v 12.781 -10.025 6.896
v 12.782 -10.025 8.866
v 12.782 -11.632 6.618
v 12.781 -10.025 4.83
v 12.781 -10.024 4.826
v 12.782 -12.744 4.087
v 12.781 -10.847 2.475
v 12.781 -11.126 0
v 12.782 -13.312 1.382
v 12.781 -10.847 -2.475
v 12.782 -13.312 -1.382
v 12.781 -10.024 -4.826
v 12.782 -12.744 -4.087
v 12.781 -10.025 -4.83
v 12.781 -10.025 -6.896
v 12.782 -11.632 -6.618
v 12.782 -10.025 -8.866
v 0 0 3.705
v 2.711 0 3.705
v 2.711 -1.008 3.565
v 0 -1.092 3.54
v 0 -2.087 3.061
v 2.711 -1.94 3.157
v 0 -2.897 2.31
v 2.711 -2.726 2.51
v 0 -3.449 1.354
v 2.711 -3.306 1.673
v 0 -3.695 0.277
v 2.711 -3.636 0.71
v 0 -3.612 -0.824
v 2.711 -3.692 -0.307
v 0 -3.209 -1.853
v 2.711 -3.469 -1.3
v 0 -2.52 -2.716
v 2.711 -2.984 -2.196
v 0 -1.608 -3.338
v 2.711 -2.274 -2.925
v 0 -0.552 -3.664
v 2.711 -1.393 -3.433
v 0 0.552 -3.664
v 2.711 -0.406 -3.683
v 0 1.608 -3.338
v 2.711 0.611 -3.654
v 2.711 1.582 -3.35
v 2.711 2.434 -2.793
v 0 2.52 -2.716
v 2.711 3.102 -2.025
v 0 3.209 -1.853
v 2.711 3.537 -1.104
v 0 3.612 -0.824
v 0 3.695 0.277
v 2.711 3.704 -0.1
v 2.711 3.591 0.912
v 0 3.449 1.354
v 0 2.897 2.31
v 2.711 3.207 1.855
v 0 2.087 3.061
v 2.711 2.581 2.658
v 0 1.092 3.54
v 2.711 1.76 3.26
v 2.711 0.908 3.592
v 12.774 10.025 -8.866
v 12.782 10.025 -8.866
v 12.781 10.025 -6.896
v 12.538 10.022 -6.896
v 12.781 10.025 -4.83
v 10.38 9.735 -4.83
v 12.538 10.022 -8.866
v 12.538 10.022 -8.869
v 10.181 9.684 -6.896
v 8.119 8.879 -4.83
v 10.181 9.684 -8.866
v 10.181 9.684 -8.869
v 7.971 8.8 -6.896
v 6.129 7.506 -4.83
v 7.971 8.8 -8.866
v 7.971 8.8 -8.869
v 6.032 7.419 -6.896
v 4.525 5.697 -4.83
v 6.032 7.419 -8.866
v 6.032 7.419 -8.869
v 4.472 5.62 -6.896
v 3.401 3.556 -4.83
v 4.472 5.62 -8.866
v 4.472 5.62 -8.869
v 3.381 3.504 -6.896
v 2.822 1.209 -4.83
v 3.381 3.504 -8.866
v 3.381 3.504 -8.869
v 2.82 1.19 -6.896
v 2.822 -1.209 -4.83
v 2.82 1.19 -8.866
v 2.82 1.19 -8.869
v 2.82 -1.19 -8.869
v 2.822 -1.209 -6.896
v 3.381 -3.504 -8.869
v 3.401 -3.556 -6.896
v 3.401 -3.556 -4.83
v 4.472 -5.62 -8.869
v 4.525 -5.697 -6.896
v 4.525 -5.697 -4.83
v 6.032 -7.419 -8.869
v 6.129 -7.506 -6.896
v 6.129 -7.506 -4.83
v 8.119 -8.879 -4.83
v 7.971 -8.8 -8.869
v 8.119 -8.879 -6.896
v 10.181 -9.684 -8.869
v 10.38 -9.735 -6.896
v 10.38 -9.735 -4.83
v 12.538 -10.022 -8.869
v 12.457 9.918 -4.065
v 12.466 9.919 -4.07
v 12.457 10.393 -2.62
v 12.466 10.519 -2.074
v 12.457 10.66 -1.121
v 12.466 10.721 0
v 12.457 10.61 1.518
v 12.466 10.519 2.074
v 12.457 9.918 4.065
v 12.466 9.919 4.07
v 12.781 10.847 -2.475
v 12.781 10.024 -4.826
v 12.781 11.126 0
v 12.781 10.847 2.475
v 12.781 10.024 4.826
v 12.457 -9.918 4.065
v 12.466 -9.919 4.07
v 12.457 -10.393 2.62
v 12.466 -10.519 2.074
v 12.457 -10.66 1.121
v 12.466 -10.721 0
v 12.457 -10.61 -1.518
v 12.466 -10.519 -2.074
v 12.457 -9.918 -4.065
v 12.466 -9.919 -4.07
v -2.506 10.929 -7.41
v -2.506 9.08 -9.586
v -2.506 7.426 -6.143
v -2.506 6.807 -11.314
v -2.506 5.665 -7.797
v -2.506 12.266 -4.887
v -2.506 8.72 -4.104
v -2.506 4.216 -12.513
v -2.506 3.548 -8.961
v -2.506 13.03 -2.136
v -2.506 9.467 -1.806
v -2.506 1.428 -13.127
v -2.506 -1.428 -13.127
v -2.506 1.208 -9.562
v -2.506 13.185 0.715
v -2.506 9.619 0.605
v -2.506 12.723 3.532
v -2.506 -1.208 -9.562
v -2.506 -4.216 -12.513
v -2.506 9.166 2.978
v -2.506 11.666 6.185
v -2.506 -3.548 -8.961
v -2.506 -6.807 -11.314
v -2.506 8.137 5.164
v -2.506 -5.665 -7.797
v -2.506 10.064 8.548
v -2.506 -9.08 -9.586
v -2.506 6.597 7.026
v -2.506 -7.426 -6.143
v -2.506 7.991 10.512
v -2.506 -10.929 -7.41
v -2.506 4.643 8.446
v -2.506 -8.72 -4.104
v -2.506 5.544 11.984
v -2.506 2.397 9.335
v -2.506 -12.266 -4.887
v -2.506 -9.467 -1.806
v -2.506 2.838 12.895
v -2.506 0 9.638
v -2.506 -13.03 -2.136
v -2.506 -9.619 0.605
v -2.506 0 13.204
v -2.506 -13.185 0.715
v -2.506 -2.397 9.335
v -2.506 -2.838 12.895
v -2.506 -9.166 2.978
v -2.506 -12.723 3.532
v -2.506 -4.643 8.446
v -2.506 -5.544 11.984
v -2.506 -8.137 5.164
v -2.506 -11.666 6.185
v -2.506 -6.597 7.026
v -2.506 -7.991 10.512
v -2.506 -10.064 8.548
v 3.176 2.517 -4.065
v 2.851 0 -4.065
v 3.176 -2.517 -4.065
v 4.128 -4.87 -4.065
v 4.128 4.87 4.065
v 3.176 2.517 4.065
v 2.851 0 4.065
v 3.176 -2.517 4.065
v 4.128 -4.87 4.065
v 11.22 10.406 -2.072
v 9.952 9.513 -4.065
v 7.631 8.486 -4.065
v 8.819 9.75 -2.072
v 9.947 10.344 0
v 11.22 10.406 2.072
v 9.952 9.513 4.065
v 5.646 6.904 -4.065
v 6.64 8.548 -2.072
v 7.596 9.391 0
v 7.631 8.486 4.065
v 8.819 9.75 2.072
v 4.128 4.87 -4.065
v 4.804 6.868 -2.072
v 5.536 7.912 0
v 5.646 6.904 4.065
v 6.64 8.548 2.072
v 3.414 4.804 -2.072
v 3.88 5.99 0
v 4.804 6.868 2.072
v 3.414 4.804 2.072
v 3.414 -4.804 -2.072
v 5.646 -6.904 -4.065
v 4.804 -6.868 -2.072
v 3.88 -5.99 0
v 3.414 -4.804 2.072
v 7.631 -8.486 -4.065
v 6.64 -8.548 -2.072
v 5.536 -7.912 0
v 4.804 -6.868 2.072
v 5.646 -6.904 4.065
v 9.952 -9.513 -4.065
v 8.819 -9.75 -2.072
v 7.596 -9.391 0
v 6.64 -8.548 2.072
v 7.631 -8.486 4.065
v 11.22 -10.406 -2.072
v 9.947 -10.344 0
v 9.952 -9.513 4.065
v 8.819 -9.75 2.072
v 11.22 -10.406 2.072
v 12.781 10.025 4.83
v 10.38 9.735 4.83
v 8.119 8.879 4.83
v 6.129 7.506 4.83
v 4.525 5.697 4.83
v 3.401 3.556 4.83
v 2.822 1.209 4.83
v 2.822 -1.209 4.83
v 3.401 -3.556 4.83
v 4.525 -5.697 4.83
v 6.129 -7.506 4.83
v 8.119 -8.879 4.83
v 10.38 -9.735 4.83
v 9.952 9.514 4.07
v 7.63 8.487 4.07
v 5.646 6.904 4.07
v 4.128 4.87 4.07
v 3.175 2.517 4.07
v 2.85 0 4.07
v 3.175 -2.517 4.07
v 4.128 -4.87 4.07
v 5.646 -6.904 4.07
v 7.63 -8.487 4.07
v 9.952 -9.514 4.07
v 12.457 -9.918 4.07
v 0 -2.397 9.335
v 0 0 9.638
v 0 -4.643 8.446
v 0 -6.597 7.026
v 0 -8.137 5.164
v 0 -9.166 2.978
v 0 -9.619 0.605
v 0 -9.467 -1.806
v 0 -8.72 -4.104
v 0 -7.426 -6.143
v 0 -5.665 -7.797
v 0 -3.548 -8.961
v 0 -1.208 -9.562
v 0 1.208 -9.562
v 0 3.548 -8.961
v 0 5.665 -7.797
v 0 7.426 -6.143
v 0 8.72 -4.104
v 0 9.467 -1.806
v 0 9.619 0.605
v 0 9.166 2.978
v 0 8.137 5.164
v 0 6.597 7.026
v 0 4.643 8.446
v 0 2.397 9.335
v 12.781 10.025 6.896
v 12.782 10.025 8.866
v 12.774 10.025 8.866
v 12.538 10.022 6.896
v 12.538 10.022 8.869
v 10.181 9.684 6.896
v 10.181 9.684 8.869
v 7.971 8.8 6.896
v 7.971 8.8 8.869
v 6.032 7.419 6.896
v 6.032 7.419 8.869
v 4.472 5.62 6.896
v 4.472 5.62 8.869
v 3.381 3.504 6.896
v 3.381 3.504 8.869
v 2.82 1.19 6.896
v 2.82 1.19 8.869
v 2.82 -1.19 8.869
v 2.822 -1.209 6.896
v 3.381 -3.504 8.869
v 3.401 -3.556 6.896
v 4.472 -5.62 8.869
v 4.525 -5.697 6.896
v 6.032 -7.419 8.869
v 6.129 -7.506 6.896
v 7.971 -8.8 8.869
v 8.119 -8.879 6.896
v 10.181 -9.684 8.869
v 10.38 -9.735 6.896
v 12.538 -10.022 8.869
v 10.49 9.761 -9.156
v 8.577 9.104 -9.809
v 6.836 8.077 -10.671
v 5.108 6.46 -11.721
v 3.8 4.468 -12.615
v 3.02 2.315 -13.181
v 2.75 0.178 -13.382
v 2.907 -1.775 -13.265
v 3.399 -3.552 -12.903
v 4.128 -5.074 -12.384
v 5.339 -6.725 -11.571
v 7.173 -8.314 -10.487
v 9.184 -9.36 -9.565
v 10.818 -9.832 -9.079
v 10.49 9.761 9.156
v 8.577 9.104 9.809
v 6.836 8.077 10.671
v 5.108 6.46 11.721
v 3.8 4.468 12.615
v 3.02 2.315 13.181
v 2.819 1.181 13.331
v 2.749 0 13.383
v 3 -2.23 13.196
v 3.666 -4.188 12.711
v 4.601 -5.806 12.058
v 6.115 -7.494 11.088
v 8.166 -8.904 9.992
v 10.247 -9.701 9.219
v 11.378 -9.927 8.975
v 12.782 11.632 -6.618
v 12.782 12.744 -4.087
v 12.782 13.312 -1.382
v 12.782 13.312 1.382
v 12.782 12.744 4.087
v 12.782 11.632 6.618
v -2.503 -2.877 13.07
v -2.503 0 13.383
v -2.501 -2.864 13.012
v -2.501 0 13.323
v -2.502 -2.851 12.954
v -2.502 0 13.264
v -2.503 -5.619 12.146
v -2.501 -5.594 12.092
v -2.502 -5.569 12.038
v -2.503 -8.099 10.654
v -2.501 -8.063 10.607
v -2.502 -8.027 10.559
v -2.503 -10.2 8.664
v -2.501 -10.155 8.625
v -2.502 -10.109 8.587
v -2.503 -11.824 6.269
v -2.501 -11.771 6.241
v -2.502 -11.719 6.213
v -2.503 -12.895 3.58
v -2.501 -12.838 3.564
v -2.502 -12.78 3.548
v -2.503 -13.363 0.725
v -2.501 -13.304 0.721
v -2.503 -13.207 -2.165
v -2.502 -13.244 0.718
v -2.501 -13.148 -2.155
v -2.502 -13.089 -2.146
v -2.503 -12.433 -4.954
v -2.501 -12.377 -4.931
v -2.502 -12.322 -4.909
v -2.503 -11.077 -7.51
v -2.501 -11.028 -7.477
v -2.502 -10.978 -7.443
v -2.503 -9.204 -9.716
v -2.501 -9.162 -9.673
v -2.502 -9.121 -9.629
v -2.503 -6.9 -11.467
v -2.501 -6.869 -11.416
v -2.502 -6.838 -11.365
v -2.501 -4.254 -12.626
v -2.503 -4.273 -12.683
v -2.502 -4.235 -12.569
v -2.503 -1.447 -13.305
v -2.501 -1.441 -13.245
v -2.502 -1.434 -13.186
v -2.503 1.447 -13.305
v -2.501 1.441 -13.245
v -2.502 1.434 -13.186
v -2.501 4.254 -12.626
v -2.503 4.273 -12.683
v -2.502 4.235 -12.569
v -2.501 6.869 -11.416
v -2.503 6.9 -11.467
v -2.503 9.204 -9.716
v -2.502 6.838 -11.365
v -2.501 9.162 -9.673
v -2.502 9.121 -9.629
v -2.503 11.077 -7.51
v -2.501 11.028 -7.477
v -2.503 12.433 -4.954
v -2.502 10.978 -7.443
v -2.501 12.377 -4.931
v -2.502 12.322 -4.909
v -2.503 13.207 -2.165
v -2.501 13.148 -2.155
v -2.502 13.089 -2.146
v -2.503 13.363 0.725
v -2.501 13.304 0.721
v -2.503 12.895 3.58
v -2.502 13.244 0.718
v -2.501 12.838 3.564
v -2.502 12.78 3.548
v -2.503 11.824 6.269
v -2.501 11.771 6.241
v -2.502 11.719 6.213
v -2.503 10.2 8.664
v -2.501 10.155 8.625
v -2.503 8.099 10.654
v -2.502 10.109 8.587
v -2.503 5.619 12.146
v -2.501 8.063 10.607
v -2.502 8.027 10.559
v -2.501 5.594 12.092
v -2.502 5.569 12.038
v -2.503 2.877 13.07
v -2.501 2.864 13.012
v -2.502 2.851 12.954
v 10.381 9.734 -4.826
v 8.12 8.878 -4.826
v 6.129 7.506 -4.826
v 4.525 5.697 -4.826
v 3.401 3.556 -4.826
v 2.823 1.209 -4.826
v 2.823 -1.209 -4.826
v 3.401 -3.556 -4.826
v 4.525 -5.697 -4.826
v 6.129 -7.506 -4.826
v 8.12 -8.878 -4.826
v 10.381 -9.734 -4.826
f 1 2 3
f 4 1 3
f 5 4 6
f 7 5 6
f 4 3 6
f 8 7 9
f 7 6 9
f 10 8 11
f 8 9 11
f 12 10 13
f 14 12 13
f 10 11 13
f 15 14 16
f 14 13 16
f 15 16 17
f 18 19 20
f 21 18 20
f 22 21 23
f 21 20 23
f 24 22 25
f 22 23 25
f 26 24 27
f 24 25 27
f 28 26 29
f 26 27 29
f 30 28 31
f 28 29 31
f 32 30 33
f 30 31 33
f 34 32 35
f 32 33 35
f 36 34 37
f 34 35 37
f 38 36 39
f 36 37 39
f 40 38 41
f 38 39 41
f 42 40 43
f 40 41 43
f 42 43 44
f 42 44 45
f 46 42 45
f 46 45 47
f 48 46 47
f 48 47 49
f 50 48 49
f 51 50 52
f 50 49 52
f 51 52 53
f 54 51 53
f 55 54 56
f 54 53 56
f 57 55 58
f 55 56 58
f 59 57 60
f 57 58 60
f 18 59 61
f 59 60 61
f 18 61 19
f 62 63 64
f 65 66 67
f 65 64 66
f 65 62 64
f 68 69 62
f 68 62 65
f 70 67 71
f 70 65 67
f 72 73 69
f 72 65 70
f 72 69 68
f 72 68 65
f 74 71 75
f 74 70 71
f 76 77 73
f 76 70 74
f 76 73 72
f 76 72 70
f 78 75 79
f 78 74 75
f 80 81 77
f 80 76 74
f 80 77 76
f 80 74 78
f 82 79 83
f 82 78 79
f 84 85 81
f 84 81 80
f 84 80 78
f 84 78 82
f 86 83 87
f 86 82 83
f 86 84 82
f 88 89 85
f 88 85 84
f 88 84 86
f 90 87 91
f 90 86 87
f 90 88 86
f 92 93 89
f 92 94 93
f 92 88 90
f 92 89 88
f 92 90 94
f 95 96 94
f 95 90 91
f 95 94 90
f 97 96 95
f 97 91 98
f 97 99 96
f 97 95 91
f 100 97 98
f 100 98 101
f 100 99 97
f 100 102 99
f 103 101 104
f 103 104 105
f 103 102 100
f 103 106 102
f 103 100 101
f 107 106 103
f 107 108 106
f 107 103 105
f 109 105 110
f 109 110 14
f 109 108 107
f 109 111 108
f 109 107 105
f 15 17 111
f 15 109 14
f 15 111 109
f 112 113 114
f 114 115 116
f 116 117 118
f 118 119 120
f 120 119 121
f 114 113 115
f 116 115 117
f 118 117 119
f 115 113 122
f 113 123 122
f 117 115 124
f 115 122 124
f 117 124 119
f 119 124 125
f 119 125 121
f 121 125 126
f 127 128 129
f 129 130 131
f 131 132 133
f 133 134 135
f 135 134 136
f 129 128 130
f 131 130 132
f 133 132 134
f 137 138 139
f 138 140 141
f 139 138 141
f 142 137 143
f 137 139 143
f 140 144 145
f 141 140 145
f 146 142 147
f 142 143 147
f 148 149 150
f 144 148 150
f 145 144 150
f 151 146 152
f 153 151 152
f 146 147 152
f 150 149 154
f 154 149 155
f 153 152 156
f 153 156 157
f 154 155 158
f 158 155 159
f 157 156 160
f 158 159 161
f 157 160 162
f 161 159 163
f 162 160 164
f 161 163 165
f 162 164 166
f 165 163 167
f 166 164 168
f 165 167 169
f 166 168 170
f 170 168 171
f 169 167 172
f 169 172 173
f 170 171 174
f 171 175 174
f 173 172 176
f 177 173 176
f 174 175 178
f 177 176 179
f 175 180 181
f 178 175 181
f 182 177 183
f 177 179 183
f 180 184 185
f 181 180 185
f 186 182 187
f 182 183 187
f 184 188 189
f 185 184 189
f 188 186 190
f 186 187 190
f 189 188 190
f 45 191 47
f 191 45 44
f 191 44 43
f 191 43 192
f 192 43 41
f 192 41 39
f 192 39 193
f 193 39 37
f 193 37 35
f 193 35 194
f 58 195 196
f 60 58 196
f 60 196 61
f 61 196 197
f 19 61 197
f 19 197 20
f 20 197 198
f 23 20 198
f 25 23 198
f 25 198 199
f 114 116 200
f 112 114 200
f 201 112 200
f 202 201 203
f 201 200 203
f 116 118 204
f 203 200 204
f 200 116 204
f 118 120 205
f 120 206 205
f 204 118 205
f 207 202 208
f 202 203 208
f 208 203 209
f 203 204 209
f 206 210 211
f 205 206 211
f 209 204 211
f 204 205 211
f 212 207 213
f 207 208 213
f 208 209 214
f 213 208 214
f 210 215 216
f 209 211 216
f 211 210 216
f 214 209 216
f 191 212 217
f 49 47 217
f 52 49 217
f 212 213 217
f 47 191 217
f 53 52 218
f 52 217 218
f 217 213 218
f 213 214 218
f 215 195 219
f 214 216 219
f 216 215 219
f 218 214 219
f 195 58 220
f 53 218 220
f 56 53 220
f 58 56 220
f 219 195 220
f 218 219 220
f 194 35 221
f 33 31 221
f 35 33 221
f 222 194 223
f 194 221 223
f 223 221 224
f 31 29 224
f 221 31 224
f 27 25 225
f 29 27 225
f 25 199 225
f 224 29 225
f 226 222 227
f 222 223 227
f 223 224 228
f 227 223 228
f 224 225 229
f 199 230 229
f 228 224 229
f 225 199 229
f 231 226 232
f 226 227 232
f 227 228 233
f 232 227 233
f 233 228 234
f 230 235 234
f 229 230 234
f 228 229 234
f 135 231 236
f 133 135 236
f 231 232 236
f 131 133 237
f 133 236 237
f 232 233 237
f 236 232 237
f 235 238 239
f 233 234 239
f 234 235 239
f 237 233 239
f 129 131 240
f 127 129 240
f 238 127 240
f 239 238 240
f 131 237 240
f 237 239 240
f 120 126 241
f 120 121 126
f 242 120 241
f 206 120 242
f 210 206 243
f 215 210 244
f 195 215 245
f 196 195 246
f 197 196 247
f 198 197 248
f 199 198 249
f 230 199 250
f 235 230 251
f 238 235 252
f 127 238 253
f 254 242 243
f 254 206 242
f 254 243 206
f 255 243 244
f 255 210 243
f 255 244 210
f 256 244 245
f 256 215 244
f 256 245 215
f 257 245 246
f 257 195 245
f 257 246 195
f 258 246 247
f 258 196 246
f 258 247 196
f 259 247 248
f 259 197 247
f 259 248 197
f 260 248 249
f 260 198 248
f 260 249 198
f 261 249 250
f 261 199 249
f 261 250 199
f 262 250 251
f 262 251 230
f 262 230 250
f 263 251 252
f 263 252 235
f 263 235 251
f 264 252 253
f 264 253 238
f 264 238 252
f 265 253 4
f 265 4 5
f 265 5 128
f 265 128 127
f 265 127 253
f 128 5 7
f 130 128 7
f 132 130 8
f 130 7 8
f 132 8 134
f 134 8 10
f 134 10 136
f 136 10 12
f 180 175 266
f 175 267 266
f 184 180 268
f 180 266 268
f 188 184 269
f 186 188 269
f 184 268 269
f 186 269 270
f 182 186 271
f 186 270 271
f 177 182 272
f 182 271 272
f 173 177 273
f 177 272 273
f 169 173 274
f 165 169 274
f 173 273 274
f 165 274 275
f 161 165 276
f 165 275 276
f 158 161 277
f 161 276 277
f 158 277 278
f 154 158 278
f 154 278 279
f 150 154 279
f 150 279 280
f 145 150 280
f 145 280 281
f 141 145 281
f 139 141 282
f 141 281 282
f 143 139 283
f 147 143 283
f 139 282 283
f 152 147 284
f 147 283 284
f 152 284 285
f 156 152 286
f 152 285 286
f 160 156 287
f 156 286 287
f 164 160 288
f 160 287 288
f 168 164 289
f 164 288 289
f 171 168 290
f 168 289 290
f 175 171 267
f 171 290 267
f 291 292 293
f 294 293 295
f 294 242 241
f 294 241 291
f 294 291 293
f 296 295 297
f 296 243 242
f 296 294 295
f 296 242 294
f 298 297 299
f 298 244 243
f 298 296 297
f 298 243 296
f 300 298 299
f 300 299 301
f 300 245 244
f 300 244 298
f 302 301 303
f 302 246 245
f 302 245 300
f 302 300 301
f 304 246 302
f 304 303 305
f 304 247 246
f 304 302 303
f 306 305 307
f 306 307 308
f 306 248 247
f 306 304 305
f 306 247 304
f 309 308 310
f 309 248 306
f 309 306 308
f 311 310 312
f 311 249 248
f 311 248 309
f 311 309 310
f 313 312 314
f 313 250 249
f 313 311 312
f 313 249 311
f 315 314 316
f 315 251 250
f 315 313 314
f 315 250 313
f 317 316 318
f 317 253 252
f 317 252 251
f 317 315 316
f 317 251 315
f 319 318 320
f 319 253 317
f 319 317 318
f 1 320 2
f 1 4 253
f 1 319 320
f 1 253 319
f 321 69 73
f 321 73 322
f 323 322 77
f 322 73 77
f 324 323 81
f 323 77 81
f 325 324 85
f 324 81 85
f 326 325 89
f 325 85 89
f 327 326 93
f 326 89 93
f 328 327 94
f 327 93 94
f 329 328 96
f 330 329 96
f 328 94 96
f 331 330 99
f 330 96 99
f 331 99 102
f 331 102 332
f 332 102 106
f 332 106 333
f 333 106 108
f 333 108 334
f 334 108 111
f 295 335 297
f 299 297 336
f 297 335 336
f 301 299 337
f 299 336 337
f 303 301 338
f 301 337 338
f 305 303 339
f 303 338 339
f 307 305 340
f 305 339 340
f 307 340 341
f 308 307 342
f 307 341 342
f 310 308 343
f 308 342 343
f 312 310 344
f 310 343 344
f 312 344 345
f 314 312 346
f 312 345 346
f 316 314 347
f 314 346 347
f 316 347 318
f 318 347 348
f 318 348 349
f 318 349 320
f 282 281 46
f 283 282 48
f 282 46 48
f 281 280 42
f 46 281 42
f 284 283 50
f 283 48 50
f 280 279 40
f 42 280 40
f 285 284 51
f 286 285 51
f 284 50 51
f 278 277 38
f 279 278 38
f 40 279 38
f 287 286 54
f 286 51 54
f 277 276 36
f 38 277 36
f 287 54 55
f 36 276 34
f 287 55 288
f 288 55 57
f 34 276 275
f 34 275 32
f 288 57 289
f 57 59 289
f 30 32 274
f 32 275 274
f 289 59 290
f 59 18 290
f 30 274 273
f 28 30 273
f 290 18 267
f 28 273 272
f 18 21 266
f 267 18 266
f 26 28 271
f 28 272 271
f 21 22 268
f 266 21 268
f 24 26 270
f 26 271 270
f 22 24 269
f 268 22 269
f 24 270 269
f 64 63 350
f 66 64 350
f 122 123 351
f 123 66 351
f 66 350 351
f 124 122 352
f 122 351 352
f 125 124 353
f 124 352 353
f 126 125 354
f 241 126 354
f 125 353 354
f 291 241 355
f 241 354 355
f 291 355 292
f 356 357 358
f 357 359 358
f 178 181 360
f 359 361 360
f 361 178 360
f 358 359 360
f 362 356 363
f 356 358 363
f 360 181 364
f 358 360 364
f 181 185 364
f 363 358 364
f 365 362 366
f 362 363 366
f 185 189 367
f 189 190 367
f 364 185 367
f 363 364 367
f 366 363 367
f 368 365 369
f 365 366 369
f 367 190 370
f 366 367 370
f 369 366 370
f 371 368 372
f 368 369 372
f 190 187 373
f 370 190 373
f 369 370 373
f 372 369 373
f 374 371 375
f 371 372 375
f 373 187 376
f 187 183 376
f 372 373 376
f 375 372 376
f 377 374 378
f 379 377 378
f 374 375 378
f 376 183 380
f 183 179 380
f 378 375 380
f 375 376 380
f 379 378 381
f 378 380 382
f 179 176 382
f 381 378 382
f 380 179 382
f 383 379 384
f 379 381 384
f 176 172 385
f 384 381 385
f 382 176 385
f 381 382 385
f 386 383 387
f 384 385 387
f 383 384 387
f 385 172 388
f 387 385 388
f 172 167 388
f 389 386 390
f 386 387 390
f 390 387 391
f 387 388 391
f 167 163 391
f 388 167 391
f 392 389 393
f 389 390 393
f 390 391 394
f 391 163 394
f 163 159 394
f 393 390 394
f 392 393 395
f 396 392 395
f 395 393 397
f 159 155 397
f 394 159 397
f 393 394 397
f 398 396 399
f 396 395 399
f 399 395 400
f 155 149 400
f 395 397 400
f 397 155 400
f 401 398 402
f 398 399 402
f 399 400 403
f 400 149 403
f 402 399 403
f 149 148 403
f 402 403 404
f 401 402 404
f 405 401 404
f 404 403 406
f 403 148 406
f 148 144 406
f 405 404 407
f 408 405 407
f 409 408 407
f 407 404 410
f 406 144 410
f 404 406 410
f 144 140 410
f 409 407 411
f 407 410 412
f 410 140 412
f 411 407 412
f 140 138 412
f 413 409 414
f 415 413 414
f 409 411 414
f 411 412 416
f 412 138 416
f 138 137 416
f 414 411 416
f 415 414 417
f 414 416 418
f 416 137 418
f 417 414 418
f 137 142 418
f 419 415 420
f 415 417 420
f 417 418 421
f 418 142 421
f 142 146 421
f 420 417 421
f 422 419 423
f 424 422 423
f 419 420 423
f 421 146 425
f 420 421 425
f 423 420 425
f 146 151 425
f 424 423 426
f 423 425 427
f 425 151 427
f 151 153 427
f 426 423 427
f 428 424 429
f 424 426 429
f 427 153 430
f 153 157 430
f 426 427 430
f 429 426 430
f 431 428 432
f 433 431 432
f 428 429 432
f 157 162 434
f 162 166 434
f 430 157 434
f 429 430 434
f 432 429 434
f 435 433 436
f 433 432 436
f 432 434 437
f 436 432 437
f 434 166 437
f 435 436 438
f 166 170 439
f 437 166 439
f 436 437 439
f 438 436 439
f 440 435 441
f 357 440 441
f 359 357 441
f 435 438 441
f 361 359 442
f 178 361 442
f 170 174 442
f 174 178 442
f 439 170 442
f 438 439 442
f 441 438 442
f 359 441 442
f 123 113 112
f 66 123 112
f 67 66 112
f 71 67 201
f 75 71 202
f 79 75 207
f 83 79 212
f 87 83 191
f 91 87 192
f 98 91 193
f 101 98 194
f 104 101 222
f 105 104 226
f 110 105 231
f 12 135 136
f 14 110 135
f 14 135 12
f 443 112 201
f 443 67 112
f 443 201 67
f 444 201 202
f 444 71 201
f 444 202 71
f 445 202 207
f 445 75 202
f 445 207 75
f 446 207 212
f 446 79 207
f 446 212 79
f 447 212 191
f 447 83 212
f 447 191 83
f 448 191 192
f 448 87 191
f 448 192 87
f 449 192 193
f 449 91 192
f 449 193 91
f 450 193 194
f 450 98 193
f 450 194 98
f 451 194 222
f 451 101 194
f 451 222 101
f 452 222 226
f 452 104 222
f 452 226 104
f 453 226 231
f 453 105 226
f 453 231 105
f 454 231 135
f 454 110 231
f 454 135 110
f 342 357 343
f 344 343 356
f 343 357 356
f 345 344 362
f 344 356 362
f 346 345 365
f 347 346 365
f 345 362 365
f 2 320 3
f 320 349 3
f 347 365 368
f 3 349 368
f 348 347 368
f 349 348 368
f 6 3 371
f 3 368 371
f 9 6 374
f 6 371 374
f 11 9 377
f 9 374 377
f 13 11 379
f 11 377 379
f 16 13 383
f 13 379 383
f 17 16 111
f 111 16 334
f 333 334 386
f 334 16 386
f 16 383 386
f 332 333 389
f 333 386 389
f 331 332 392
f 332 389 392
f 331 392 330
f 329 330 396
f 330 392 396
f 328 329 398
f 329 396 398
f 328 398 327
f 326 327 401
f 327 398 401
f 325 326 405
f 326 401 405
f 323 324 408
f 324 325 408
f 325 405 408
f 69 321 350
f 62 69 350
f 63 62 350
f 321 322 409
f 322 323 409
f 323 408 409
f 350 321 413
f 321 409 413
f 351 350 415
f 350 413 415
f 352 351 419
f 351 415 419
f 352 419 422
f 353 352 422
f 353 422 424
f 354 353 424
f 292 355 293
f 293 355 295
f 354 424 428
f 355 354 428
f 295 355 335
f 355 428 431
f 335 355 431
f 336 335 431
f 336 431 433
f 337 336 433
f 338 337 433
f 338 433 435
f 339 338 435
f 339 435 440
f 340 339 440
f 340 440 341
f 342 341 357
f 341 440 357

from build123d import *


with BuildPart() as part:
    # Çizim1 → Döndür1 (revolve)
    with BuildSketch(Plane(origin=(0, 0, 0), x_dir=(1, 0, 0), z_dir=(0, 1, 0)), mode=Mode.PRIVATE) as d_nd_r1_sk:
        with BuildLine():
            Line((12.781543507, 13.383116119), (-2.50303312, 13.383116119))
            ThreePointArc((-2.50303312, 13.383116119), (-2.501361875, 13.293526957), (-2.506133274, 13.204049335))
            Line((-2.506133274, 13.204049335), (-2.506133274, 9.63773694))
            Line((-2.506133274, 9.63773694), (0, 9.63773694))
            Line((0, 9.63773694), (0, 3.705))
            Line((0, 3.705), (4.808638309, 3.705))
            ThreePointArc((4.808638309, 3.705), (5.009621244, 3.664180843), (5.185678757, 3.558994837))
            ThreePointArc((5.185678757, 3.558994837), (7.965698705, 8.014106646), (12.465543511, 10.721121396))
            ThreePointArc((12.465543511, 10.721121396), (12.633558311, 10.915283437), (12.780786925, 11.125644095))
            Line((12.780786925, 11.125644095), (12.781543507, 13.383116119))
        make_face()
    revolve(d_nd_r1_sk.sketch.rotate(Axis((0, 0, 0), (1, 0, 0)), 180), axis=Axis((0, 0, 0), (1, 0, 0)))

    # Çizim2 → Kes-Döndür3 (revolve, cut)
    with BuildSketch(Plane.ZY.offset(-12.773866726)):
        with BuildLine():
            Line((13.385193973, 0), (-13.385193973, 0))
            Line((-13.385193973, 0), (-16.077753665, 0))
            Line((-16.077753665, 0), (-16.077753665, 10.025014185))
            Line((-16.077753665, 10.025014185), (-8.869188704, 10.025014185))
            add(Edge.make_bspline(
                [(-4.830106972, 10.024782411), (-6.17646756, 10.024842425), (-7.522828137, 10.024922597), (-8.869188704, 10.025014185)],
                knots=[0.002442016, 0.002442016, 0.002442016, 0.002442016, 0.006481098, 0.006481098, 0.006481098, 0.006481098], degree=3))
            add(Edge.make_bspline(
                [(-4.065295391, 9.922720168), (-4.309706946, 9.966250241), (-4.566541382, 9.998257381), (-4.830106972, 10.024782411)],
                knots=[0, 0, 0, 0, 1, 1, 1, 1], degree=3))
            ThreePointArc((-4.065295391, 9.922720168), (0, 10.723199249), (4.065295391, 9.922720168))
            add(Edge.make_bspline(
                [(4.830106972, 10.024782411), (4.567249442, 9.99832864), (4.310513413, 9.966393874), (4.065295391, 9.922720168)],
                knots=[0, 0, 0, 0, 1, 1, 1, 1], degree=3))
            add(Edge.make_bspline(
                [(8.869188704, 10.025014185), (7.522828137, 10.024922597), (6.17646756, 10.024842425), (4.830106972, 10.024782411)],
                knots=[-0.01125728, -0.01125728, -0.01125728, -0.01125728, -0.007218198, -0.007218198, -0.007218198, -0.007218198], degree=3))
            Line((8.869188704, 10.025014185), (15.518432284, 10.025014185))
            Line((15.518432284, 10.025014185), (15.518432284, 0))
            Line((15.518432284, 0), (13.385193973, 0))
        make_face()
    revolve(axis=Axis((12.773866726, 0, -16.077753665), (0, 0, 1)), mode=Mode.SUBTRACT)


solid = part.part
